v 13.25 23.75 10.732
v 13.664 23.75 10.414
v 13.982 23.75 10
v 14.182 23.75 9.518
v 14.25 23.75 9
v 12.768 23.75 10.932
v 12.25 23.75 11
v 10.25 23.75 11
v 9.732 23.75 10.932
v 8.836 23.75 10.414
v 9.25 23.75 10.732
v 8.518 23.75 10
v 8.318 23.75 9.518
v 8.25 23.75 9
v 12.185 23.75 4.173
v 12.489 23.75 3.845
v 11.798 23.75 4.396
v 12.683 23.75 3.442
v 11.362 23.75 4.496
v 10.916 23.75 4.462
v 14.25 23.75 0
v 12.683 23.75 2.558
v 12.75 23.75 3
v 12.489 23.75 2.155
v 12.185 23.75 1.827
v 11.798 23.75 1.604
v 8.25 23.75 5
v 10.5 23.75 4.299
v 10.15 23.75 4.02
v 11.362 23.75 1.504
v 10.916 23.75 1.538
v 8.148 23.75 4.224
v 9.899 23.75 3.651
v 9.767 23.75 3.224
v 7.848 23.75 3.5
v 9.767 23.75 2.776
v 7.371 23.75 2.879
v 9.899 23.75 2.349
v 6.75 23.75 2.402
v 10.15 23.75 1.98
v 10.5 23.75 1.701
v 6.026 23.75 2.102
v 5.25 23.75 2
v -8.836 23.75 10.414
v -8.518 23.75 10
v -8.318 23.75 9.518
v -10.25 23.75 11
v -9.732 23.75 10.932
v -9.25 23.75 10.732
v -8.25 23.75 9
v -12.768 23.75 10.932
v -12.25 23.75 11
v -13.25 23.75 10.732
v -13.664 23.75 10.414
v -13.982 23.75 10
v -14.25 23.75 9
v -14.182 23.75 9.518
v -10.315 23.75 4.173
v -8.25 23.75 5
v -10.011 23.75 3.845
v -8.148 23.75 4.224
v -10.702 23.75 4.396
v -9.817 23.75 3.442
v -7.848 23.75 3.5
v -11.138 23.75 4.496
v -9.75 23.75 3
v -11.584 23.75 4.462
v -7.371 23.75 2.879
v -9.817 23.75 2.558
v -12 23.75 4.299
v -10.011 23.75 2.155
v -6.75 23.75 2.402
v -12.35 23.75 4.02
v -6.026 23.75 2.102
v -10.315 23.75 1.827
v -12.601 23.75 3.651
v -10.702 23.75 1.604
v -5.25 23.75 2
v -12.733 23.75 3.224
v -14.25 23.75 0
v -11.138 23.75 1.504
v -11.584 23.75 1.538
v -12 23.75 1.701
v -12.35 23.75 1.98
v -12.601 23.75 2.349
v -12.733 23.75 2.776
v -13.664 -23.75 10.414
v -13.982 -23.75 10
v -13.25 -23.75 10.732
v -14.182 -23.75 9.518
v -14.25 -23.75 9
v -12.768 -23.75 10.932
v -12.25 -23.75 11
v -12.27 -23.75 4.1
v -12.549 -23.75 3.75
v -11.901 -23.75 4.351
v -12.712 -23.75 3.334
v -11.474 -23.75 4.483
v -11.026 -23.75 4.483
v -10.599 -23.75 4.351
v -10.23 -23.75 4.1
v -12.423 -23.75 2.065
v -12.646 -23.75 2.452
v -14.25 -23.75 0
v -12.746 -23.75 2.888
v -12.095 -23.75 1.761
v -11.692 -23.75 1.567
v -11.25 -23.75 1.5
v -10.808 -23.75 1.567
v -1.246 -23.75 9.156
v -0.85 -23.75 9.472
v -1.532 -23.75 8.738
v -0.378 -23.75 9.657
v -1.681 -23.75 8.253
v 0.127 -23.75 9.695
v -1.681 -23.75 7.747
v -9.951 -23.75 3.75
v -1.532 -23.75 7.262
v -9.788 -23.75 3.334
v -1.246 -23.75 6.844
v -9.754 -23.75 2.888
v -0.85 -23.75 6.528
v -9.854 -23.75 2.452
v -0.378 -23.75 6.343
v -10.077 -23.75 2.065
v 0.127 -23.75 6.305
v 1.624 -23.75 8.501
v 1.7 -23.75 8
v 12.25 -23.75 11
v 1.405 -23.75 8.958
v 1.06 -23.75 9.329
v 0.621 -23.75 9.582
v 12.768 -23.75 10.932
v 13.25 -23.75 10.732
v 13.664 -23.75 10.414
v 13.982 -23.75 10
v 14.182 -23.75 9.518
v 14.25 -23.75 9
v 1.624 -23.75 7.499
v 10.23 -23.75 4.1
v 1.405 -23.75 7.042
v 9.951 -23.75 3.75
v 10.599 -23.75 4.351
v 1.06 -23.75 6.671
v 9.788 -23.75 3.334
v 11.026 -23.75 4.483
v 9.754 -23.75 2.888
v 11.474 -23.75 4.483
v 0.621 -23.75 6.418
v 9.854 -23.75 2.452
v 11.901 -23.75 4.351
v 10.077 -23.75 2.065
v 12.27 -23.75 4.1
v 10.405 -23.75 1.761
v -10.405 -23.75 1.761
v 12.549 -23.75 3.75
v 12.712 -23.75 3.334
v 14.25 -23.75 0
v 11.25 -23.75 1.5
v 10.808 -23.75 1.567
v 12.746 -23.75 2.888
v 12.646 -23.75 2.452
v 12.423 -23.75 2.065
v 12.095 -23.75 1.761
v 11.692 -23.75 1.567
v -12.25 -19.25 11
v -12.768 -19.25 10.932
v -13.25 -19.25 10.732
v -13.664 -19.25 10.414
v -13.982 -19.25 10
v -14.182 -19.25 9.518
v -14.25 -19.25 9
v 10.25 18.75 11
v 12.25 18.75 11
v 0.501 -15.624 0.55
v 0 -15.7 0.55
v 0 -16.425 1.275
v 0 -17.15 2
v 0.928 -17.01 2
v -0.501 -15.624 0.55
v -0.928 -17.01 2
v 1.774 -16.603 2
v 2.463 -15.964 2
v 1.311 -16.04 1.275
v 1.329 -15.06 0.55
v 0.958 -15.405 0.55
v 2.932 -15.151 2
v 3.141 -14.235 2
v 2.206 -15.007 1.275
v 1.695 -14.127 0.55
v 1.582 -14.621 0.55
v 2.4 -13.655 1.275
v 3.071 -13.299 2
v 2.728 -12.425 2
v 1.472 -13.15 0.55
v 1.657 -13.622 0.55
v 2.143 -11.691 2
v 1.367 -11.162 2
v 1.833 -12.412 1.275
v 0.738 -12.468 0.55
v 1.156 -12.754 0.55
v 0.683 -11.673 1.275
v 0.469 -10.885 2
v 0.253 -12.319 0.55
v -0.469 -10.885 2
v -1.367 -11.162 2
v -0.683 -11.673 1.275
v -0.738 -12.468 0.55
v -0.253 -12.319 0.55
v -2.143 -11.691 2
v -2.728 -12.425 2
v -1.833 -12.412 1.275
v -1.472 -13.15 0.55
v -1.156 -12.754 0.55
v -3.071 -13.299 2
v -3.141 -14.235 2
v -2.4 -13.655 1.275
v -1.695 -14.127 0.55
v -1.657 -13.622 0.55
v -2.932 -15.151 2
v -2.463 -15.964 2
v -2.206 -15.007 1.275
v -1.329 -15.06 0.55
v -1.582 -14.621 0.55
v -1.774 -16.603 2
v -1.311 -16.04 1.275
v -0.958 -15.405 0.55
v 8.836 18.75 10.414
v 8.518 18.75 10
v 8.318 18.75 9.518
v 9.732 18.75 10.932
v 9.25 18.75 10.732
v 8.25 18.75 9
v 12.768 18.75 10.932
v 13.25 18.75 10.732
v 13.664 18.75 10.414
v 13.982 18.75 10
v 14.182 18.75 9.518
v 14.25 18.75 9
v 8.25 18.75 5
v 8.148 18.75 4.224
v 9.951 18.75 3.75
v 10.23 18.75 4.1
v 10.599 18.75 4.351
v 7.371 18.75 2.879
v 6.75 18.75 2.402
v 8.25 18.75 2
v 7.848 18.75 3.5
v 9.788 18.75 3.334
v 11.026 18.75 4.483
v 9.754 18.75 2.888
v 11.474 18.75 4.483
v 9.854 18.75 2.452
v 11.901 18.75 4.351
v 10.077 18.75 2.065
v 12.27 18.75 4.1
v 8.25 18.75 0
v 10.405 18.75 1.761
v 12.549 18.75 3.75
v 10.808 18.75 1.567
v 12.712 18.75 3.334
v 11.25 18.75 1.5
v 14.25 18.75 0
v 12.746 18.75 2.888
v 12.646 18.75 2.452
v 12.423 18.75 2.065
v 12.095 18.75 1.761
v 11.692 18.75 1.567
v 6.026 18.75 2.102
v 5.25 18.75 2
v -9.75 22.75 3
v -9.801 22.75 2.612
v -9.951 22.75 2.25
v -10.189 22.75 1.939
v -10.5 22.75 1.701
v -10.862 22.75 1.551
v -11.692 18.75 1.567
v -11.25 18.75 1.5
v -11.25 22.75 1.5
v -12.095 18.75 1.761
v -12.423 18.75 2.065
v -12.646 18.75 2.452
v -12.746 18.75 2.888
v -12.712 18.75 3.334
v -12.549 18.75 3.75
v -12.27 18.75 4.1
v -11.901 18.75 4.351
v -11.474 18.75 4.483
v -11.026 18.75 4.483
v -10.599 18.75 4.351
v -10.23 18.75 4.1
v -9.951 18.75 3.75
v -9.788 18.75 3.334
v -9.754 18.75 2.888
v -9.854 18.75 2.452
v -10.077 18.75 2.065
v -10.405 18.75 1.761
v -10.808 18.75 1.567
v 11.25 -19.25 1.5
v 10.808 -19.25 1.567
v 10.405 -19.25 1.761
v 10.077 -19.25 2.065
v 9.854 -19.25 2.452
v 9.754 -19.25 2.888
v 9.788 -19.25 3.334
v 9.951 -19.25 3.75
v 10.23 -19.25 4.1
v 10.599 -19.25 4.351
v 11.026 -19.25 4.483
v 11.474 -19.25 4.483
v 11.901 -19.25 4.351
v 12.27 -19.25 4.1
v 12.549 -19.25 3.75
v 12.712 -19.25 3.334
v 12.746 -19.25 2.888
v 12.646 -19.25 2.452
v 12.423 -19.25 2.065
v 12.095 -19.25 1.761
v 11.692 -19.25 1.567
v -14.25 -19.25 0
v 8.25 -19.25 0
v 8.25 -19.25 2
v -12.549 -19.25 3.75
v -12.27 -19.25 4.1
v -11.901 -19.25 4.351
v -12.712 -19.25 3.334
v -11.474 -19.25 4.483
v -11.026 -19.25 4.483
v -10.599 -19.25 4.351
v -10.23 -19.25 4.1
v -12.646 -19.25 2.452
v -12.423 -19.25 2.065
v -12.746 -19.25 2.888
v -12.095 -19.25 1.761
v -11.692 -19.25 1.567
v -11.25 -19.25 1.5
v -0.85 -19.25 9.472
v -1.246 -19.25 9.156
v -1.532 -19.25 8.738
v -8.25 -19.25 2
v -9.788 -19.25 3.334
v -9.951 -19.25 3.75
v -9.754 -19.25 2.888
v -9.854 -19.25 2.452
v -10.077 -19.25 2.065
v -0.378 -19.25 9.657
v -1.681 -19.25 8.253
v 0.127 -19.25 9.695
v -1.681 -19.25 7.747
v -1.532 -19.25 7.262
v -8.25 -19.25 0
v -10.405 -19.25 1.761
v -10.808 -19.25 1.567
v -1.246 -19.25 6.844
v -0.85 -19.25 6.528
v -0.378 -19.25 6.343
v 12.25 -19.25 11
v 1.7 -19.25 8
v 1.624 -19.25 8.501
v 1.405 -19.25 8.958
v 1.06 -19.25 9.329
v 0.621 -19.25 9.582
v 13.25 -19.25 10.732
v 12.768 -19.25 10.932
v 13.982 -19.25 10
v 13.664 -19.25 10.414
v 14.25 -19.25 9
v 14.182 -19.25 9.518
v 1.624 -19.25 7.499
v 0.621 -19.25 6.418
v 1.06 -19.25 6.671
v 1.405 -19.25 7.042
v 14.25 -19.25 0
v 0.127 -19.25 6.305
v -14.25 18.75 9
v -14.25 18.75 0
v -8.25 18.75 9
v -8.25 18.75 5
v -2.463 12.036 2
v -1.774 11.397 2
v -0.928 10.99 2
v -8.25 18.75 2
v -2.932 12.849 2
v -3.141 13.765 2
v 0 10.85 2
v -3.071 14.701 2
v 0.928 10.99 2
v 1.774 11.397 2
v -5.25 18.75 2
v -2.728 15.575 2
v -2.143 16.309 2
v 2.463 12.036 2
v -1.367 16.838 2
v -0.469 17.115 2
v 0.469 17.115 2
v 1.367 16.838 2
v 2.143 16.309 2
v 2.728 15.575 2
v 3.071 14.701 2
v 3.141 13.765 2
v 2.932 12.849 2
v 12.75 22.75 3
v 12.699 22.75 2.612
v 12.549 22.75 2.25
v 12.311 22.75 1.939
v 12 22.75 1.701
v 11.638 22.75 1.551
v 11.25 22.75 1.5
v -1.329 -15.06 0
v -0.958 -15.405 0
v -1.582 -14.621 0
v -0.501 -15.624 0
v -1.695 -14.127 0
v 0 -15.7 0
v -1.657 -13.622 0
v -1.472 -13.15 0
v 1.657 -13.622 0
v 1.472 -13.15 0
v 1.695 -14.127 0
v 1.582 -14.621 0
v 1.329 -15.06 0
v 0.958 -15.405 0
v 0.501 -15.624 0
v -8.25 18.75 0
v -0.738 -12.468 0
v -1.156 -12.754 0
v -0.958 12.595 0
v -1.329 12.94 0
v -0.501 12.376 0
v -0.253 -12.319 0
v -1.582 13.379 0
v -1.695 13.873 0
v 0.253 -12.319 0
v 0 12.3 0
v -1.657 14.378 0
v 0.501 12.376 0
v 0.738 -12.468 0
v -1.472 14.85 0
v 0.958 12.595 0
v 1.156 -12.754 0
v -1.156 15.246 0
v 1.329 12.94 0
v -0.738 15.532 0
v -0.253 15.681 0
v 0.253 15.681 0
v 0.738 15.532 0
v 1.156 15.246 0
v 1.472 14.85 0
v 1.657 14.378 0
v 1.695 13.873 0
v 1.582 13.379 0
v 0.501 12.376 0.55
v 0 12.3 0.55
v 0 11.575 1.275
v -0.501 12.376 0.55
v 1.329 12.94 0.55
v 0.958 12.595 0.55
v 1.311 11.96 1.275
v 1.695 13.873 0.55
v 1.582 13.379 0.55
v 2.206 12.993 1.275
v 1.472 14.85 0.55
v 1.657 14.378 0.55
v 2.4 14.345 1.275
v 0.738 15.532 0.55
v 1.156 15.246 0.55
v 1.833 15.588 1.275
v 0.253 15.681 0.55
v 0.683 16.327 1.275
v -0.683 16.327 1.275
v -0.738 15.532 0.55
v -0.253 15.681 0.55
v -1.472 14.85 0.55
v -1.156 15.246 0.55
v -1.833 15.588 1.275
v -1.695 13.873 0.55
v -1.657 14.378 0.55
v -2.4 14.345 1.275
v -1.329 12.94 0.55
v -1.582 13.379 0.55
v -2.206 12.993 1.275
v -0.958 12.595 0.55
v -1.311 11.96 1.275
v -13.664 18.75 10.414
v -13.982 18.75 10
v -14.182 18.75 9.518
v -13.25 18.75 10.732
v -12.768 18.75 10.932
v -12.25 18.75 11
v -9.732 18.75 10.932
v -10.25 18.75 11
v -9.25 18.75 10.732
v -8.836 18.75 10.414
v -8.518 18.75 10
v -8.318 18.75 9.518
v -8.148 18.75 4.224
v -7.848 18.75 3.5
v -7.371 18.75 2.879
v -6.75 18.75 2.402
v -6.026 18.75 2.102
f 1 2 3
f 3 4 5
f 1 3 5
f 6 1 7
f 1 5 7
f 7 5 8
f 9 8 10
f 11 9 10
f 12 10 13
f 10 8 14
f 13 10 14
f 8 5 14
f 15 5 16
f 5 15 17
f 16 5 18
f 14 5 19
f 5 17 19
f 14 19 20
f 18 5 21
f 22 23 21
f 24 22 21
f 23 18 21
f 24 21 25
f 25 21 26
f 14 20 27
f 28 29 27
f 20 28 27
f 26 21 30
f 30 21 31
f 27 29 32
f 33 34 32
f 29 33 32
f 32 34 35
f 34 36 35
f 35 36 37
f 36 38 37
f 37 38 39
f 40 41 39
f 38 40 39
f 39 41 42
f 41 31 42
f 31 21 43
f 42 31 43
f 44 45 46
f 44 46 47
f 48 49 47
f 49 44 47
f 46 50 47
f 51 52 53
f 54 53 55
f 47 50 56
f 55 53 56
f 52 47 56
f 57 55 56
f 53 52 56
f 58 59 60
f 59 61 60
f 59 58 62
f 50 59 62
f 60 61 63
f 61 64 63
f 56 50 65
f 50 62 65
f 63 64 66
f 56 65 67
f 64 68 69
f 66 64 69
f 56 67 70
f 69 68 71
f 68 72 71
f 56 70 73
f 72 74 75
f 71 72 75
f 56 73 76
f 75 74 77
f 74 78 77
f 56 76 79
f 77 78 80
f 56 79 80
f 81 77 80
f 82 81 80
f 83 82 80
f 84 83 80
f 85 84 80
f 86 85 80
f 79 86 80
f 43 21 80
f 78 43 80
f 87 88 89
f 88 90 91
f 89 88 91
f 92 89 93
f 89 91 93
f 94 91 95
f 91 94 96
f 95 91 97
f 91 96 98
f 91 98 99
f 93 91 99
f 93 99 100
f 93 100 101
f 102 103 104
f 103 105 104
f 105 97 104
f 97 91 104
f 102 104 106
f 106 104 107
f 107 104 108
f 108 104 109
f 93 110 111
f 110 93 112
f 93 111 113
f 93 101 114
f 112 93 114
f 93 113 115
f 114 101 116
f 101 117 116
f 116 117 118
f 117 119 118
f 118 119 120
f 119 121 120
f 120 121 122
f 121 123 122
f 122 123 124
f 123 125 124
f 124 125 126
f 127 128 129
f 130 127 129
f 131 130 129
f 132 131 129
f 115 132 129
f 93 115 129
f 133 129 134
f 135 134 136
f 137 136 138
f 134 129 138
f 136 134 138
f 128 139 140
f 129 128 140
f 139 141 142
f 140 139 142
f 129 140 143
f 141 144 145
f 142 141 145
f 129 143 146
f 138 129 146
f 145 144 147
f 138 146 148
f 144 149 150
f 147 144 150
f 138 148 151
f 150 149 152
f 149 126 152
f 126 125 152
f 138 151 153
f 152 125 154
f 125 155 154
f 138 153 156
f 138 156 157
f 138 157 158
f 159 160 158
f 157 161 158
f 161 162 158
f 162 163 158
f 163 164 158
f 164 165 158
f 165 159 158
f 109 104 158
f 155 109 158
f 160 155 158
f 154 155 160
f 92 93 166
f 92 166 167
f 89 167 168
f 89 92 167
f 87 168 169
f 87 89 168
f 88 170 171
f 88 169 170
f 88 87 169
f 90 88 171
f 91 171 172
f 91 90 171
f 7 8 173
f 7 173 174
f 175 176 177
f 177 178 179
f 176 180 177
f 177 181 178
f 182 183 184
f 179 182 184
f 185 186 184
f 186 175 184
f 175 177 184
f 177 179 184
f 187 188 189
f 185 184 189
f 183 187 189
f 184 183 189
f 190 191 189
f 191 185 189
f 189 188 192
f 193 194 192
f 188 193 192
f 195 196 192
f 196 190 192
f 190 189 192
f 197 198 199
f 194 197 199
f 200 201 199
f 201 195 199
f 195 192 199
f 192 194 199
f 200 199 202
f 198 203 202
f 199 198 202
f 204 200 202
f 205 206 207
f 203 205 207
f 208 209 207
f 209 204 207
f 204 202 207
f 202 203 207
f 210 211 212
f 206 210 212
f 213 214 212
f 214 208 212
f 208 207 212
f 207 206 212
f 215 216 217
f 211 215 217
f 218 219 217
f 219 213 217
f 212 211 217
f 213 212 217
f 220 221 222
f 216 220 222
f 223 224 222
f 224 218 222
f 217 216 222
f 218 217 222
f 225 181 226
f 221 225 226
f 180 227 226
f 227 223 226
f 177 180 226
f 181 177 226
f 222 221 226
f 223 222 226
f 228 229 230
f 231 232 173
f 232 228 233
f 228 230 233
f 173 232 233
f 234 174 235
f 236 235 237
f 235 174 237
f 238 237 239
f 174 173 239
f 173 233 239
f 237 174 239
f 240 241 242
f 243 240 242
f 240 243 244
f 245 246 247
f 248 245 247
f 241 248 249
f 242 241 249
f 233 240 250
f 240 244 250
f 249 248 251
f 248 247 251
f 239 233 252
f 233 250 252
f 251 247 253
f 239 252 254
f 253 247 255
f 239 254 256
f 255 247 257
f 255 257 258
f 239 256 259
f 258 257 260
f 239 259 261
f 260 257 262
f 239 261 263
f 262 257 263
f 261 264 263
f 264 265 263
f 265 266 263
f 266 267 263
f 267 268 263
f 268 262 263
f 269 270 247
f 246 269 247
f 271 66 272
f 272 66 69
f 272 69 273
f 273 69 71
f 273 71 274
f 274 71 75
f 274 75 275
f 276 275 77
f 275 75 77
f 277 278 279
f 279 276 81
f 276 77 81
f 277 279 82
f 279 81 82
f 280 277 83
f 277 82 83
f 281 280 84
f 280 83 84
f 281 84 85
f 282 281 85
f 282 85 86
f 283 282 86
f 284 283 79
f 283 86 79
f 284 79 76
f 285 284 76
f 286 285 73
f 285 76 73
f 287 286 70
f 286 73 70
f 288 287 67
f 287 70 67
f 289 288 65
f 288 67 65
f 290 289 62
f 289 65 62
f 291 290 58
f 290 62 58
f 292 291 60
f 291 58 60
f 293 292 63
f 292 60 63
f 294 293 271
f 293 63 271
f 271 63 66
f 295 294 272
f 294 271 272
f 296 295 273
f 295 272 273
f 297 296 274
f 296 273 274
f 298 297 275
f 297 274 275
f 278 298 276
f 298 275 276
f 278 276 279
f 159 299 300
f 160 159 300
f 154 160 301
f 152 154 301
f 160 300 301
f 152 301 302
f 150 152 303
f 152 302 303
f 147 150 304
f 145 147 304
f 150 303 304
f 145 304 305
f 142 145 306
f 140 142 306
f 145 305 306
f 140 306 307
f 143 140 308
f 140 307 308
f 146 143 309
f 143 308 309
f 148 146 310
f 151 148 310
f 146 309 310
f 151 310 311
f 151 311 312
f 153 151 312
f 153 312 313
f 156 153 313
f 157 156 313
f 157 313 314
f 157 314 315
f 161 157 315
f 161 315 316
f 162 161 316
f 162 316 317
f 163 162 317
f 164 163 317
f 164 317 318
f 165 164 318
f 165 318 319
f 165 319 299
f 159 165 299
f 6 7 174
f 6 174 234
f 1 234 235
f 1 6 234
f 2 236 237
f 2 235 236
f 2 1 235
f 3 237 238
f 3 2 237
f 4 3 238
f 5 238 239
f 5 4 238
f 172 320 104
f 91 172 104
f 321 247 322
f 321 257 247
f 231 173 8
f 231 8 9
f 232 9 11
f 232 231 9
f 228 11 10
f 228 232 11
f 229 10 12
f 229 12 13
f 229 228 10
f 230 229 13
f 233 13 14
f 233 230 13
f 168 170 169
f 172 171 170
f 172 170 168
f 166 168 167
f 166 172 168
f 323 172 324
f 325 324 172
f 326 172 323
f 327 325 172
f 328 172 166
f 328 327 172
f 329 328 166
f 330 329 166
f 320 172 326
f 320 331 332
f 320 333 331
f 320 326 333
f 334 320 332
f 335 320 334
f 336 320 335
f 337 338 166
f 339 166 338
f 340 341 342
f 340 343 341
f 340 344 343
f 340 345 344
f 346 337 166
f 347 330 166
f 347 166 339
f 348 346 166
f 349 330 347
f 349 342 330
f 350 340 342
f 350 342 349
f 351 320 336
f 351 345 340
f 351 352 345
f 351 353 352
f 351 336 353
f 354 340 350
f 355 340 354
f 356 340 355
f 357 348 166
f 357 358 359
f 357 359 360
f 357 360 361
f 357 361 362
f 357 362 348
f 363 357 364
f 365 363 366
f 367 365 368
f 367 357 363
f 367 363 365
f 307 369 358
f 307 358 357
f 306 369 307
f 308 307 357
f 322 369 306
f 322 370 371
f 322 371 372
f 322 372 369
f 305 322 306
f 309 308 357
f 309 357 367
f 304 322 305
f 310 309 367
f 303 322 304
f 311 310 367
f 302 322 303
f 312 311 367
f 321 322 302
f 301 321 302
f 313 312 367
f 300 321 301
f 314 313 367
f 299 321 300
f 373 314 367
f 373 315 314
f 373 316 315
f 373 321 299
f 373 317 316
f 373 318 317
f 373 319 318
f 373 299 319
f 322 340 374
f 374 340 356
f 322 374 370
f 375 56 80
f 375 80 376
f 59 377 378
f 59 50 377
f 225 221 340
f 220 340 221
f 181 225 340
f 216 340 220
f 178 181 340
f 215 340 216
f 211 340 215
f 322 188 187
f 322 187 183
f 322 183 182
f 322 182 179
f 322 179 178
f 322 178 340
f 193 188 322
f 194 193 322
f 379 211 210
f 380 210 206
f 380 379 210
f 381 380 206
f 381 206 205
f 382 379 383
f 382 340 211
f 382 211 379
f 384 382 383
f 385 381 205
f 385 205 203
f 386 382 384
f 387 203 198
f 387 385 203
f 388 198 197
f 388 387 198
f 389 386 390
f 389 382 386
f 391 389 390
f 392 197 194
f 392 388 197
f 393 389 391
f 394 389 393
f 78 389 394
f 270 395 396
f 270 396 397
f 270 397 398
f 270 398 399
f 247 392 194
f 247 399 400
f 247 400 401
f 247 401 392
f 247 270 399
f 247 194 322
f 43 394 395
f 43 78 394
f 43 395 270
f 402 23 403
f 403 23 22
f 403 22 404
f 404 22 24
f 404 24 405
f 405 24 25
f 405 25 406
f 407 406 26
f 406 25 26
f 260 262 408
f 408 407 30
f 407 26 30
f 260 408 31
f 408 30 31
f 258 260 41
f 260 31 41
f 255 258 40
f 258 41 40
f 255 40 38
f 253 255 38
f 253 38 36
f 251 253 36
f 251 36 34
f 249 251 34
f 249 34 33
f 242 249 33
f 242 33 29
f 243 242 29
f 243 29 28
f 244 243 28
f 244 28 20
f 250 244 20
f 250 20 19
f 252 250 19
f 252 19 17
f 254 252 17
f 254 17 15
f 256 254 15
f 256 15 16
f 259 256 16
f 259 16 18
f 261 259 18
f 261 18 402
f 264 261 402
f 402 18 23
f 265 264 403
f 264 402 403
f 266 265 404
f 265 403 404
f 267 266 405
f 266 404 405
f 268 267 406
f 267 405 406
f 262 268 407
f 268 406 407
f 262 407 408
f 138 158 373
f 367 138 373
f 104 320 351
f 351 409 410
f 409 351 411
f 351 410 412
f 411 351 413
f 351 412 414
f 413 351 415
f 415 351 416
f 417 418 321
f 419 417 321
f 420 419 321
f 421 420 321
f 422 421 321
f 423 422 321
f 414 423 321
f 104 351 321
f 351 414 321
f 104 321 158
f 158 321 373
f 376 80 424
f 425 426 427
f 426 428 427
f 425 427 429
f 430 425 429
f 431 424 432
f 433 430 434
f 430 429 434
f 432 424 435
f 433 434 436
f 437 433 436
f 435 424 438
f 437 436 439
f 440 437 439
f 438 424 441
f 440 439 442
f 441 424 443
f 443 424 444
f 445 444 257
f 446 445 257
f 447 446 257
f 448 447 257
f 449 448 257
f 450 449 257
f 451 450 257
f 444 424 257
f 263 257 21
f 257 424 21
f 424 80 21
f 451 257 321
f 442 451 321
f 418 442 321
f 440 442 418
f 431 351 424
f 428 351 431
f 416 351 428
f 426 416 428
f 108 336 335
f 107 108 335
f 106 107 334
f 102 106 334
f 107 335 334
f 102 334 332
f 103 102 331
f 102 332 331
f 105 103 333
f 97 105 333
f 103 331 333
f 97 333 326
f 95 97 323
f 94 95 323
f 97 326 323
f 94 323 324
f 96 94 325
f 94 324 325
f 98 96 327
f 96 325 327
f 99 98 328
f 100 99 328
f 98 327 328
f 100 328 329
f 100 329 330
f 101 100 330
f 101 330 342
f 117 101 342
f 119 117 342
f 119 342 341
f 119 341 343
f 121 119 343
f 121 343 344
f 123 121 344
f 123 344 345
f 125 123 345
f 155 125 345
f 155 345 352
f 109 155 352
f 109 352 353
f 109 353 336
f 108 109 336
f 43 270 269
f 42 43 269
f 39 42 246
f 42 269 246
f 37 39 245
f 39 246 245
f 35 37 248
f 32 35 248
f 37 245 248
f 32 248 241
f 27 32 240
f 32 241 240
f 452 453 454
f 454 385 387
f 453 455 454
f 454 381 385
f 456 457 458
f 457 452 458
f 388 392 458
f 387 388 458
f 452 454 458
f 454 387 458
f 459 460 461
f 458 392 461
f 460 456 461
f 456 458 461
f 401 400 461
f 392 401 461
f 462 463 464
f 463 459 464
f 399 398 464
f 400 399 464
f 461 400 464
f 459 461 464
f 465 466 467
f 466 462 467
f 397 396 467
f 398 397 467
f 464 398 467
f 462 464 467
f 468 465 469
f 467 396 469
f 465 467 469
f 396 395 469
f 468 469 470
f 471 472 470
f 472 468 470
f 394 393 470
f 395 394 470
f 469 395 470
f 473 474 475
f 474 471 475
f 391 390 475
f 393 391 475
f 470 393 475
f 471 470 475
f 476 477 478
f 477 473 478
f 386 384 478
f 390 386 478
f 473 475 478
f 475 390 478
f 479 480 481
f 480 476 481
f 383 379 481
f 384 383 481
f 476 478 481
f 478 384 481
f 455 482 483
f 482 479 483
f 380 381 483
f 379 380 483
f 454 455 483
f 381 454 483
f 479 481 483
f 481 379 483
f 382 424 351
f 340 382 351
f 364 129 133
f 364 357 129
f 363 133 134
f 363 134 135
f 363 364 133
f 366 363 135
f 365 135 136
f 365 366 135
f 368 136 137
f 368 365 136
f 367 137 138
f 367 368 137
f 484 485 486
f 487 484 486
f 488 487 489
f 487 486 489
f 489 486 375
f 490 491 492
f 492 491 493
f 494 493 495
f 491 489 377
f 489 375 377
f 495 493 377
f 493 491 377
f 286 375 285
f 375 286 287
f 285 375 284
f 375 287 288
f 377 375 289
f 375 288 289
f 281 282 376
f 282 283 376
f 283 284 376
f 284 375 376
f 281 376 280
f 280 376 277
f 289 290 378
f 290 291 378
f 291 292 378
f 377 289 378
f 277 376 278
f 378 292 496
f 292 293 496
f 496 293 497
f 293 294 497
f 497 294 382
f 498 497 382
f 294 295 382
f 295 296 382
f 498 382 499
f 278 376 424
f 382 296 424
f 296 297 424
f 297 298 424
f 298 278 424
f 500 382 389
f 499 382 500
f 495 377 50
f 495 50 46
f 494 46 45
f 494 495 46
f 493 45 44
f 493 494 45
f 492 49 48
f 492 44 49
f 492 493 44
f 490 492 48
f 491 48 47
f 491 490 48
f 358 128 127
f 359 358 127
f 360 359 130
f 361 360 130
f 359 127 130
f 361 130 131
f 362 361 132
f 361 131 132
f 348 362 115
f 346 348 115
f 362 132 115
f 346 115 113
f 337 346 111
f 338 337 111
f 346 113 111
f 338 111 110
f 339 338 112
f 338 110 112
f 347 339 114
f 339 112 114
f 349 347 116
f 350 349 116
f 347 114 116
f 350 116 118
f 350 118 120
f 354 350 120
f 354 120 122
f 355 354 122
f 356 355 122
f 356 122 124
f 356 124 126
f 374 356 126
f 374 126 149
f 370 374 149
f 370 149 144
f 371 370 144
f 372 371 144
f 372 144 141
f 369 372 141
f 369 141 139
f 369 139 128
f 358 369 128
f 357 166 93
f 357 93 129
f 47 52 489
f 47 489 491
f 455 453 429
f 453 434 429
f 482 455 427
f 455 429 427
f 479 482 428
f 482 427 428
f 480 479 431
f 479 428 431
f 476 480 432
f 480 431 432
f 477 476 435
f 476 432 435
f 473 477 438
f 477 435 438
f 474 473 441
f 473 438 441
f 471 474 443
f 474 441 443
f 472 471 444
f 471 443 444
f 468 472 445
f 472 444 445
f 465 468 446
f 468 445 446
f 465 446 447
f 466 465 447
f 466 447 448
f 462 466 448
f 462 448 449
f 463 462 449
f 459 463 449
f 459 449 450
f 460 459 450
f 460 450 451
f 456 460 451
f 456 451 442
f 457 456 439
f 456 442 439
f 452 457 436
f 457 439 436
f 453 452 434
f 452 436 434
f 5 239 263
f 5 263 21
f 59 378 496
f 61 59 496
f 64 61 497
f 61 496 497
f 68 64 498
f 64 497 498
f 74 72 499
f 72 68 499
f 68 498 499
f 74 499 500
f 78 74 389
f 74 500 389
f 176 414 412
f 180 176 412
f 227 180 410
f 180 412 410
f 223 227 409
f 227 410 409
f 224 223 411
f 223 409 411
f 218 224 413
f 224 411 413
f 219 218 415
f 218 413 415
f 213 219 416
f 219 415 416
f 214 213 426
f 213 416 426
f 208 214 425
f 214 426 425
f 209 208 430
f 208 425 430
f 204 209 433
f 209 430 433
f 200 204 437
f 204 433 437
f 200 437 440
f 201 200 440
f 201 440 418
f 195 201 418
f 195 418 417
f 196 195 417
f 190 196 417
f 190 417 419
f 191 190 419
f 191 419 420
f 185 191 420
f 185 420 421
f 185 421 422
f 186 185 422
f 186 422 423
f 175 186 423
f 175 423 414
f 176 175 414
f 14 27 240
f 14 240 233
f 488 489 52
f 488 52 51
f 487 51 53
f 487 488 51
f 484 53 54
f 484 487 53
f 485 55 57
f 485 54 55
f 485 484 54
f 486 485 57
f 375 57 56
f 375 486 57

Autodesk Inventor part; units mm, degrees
ref_plane "YZ Plane" through (0, 0, 0) normal (1, 0, 0) x (0, 1, 0)
ref_plane "XZ Plane" through (0, 0, 0) normal (0, 1, 0) x (-1, 0, 0)
sketch "Sketch1" plane through (0, 0, 0) normal (0, 0, 1) x (1, 0, 0)
  line L0 (-14.25, -23.75) -> (14.25, -23.75)
  line L1 (14.25, -23.75) -> (14.25, 23.75)
  line L2 (14.25, 23.75) -> (-14.25, 23.75)
  line L3 (-14.25, 23.75) -> (-14.25, -23.75)
  line L4 (-14.25, -23.75) -> (14.25, 23.75) construction
  line L5 (14.25, -23.75) -> (-14.25, 23.75) construction
  line L6 (-14.25, 18.75) -> (14.25, 18.75)
  line L7 (-14.25, -19.25) -> (14.25, -19.25)
  line L8 (-8.25, 18.75) -> (-8.25, -19.25)
  line L9 (8.25, 18.75) -> (8.25, -19.25)
  point P0 (0, 0)
  dimension "d0" = 28.5
  dimension "d1" = 47.5
  dimension "d36" = 4.5
  dimension "d37" = 5
  dimension "d38" = 6
  dimension "d39" = 6
extrude "Extrusion1" add sketch "Sketch1" along normal blind 2 contours L3 L7 L1 L0 | L3 L2 L1 L6 | L8 L6 L9 L7
sketch "Sketch2" plane through (0, 0, 2) normal (0, 0, 1) x (1, 0, 0)
  line L0 (-14.25, 23.75) -> (-14.25, -23.75) projected
  line L1 (14.25, -23.75) -> (14.25, 23.75) projected
  line L2 (-14.25, -23.75) -> (14.25, -23.75)
  line L3 (14.25, -23.75) -> (14.25, -19.25)
  line L4 (14.25, -19.25) -> (-14.25, -19.25)
  line L5 (-14.25, -19.25) -> (-14.25, -23.75)
  line L6 (-14.25, 23.75) -> (14.25, 23.75)
  line L7 (14.25, 23.75) -> (14.25, 18.75)
  line L8 (14.25, 18.75) -> (-14.25, 18.75)
  line L9 (-14.25, 18.75) -> (-14.25, 23.75)
  point P0 (0, 0)
  point P1 (14.25, 23.75)
  dimension "d4" = 4.5
  dimension "d19" = 5
extrude "Extrusion2" add sketch "Sketch2" along normal blind 9 contours L6 L1 L8 L0 | L4 L1 L2 L0
sketch "Sketch3" plane through (-14.25, -23.75, 0) normal (0, -1, 0) x (1, 0, 0)
  line L0 (0, 11) -> (28.5, 11) construction
  line L1 (14.25, 11) -> (14.25, 0) construction
  line L2 (3, 3) -> (25.5, 3) construction
  line L3 (0, 0) -> (28.5, 0) construction
  point P0 (14.25, 3)
  dimension "d7" = 22.5
  dimension "d8" = 3
hole "Hole1" at (-11.25, -23.75, 3) at (11.25, -23.75, 3) direction (0, 1, 0) diameter 3 depth 46.5 tip angle 118
sketch "Sketch4" plane through (-14.25, -23.75, 0) normal (0, -1, 0) x (1, 0, 0)
  circle A0 centre (3, 3) radius 1.5 construction
  circle A1 centre (25.5, 3) radius 1.5 construction
  line L0 (3, 3) -> (25.5, 3) construction
  circle A2 centre (14.25, 8) radius 1.7
  line L1 (14.25, 8) -> (14.25, 3) construction
  point P0 (14.25, 0)
  dimension "d40" = 5
  dimension "d41" = 3.4
extrude "Extrusion3" cut sketch "Sketch4" against normal up to surface (4.5 mm away)
sketch "Sketch6" plane through (-14.25, 23.75, 0) normal (0, 1, 0) x (1, 0, 0)
  line L0 (22.5, -11) -> (6, -11)
  line L1 (6, -11) -> (6, -2)
  line L2 (6, -2) -> (22.5, -2)
  line L3 (22.5, -2) -> (22.5, -11)
  line L4 (22.5, -11) -> (6, -2) construction
  line L5 (6, -11) -> (22.5, -2) construction
  line L6 (14.25, 0) -> (14.25, -11) construction
  line L7 (28.5, -11) -> (0, -11) construction
  line L8 (22.5, -2) -> (6, -2) construction
  circle A0 centre (25.5, -3) radius 1.5 projected
  circle A1 centre (3, -3) radius 1.5 projected
  point P0 (14.25, -6.5)
  point P1 (14.25, -6.5)
extrude "Extrusion5" cut sketch "Sketch6" against normal up to surface (5 mm away)
fillet "Fillet1" radius 2 6 edges at (-14.25, 21.25, 11) (14.25, 21.25, 11) (-14.25, -21.5, 11) (14.25, -21.5, 11) (-8.25, 21.25, 11) (8.25, 21.25, 11)
fillet "Fillet2" radius 3 2 edges at (-8.25, 21.25, 2) (8.25, 21.25, 2)
ref_plane "Work Plane1" through (-9.075, -7.1151, 3.005) normal (0, 1, 0) x (0, 0, 1)
sketch "Sketch10" plane through (0, 0, 2) normal (0, 0, 1) x (1, 0, 0)
  line L0 (0, 14) -> (0, -14) construction
  point P0 (0, 0)
  point P1 (0, 0)
  dimension "d46" = 28
hole "Hole2" at (0, 14, 2) at (0, -14, 2) direction (0, 0, -1) diameter 3.4 depth 46.5 tip angle 118 countersink diameter 6.3 countersink angle 90 clearance for "Senkschraube mit Linsenkopf ISO 2010" size "M3" standard "DIN"
equation "\"d1\" = 1.66667 * d0"
equation "\"d39\" = d38"
properties part number "Tension_Bock"
